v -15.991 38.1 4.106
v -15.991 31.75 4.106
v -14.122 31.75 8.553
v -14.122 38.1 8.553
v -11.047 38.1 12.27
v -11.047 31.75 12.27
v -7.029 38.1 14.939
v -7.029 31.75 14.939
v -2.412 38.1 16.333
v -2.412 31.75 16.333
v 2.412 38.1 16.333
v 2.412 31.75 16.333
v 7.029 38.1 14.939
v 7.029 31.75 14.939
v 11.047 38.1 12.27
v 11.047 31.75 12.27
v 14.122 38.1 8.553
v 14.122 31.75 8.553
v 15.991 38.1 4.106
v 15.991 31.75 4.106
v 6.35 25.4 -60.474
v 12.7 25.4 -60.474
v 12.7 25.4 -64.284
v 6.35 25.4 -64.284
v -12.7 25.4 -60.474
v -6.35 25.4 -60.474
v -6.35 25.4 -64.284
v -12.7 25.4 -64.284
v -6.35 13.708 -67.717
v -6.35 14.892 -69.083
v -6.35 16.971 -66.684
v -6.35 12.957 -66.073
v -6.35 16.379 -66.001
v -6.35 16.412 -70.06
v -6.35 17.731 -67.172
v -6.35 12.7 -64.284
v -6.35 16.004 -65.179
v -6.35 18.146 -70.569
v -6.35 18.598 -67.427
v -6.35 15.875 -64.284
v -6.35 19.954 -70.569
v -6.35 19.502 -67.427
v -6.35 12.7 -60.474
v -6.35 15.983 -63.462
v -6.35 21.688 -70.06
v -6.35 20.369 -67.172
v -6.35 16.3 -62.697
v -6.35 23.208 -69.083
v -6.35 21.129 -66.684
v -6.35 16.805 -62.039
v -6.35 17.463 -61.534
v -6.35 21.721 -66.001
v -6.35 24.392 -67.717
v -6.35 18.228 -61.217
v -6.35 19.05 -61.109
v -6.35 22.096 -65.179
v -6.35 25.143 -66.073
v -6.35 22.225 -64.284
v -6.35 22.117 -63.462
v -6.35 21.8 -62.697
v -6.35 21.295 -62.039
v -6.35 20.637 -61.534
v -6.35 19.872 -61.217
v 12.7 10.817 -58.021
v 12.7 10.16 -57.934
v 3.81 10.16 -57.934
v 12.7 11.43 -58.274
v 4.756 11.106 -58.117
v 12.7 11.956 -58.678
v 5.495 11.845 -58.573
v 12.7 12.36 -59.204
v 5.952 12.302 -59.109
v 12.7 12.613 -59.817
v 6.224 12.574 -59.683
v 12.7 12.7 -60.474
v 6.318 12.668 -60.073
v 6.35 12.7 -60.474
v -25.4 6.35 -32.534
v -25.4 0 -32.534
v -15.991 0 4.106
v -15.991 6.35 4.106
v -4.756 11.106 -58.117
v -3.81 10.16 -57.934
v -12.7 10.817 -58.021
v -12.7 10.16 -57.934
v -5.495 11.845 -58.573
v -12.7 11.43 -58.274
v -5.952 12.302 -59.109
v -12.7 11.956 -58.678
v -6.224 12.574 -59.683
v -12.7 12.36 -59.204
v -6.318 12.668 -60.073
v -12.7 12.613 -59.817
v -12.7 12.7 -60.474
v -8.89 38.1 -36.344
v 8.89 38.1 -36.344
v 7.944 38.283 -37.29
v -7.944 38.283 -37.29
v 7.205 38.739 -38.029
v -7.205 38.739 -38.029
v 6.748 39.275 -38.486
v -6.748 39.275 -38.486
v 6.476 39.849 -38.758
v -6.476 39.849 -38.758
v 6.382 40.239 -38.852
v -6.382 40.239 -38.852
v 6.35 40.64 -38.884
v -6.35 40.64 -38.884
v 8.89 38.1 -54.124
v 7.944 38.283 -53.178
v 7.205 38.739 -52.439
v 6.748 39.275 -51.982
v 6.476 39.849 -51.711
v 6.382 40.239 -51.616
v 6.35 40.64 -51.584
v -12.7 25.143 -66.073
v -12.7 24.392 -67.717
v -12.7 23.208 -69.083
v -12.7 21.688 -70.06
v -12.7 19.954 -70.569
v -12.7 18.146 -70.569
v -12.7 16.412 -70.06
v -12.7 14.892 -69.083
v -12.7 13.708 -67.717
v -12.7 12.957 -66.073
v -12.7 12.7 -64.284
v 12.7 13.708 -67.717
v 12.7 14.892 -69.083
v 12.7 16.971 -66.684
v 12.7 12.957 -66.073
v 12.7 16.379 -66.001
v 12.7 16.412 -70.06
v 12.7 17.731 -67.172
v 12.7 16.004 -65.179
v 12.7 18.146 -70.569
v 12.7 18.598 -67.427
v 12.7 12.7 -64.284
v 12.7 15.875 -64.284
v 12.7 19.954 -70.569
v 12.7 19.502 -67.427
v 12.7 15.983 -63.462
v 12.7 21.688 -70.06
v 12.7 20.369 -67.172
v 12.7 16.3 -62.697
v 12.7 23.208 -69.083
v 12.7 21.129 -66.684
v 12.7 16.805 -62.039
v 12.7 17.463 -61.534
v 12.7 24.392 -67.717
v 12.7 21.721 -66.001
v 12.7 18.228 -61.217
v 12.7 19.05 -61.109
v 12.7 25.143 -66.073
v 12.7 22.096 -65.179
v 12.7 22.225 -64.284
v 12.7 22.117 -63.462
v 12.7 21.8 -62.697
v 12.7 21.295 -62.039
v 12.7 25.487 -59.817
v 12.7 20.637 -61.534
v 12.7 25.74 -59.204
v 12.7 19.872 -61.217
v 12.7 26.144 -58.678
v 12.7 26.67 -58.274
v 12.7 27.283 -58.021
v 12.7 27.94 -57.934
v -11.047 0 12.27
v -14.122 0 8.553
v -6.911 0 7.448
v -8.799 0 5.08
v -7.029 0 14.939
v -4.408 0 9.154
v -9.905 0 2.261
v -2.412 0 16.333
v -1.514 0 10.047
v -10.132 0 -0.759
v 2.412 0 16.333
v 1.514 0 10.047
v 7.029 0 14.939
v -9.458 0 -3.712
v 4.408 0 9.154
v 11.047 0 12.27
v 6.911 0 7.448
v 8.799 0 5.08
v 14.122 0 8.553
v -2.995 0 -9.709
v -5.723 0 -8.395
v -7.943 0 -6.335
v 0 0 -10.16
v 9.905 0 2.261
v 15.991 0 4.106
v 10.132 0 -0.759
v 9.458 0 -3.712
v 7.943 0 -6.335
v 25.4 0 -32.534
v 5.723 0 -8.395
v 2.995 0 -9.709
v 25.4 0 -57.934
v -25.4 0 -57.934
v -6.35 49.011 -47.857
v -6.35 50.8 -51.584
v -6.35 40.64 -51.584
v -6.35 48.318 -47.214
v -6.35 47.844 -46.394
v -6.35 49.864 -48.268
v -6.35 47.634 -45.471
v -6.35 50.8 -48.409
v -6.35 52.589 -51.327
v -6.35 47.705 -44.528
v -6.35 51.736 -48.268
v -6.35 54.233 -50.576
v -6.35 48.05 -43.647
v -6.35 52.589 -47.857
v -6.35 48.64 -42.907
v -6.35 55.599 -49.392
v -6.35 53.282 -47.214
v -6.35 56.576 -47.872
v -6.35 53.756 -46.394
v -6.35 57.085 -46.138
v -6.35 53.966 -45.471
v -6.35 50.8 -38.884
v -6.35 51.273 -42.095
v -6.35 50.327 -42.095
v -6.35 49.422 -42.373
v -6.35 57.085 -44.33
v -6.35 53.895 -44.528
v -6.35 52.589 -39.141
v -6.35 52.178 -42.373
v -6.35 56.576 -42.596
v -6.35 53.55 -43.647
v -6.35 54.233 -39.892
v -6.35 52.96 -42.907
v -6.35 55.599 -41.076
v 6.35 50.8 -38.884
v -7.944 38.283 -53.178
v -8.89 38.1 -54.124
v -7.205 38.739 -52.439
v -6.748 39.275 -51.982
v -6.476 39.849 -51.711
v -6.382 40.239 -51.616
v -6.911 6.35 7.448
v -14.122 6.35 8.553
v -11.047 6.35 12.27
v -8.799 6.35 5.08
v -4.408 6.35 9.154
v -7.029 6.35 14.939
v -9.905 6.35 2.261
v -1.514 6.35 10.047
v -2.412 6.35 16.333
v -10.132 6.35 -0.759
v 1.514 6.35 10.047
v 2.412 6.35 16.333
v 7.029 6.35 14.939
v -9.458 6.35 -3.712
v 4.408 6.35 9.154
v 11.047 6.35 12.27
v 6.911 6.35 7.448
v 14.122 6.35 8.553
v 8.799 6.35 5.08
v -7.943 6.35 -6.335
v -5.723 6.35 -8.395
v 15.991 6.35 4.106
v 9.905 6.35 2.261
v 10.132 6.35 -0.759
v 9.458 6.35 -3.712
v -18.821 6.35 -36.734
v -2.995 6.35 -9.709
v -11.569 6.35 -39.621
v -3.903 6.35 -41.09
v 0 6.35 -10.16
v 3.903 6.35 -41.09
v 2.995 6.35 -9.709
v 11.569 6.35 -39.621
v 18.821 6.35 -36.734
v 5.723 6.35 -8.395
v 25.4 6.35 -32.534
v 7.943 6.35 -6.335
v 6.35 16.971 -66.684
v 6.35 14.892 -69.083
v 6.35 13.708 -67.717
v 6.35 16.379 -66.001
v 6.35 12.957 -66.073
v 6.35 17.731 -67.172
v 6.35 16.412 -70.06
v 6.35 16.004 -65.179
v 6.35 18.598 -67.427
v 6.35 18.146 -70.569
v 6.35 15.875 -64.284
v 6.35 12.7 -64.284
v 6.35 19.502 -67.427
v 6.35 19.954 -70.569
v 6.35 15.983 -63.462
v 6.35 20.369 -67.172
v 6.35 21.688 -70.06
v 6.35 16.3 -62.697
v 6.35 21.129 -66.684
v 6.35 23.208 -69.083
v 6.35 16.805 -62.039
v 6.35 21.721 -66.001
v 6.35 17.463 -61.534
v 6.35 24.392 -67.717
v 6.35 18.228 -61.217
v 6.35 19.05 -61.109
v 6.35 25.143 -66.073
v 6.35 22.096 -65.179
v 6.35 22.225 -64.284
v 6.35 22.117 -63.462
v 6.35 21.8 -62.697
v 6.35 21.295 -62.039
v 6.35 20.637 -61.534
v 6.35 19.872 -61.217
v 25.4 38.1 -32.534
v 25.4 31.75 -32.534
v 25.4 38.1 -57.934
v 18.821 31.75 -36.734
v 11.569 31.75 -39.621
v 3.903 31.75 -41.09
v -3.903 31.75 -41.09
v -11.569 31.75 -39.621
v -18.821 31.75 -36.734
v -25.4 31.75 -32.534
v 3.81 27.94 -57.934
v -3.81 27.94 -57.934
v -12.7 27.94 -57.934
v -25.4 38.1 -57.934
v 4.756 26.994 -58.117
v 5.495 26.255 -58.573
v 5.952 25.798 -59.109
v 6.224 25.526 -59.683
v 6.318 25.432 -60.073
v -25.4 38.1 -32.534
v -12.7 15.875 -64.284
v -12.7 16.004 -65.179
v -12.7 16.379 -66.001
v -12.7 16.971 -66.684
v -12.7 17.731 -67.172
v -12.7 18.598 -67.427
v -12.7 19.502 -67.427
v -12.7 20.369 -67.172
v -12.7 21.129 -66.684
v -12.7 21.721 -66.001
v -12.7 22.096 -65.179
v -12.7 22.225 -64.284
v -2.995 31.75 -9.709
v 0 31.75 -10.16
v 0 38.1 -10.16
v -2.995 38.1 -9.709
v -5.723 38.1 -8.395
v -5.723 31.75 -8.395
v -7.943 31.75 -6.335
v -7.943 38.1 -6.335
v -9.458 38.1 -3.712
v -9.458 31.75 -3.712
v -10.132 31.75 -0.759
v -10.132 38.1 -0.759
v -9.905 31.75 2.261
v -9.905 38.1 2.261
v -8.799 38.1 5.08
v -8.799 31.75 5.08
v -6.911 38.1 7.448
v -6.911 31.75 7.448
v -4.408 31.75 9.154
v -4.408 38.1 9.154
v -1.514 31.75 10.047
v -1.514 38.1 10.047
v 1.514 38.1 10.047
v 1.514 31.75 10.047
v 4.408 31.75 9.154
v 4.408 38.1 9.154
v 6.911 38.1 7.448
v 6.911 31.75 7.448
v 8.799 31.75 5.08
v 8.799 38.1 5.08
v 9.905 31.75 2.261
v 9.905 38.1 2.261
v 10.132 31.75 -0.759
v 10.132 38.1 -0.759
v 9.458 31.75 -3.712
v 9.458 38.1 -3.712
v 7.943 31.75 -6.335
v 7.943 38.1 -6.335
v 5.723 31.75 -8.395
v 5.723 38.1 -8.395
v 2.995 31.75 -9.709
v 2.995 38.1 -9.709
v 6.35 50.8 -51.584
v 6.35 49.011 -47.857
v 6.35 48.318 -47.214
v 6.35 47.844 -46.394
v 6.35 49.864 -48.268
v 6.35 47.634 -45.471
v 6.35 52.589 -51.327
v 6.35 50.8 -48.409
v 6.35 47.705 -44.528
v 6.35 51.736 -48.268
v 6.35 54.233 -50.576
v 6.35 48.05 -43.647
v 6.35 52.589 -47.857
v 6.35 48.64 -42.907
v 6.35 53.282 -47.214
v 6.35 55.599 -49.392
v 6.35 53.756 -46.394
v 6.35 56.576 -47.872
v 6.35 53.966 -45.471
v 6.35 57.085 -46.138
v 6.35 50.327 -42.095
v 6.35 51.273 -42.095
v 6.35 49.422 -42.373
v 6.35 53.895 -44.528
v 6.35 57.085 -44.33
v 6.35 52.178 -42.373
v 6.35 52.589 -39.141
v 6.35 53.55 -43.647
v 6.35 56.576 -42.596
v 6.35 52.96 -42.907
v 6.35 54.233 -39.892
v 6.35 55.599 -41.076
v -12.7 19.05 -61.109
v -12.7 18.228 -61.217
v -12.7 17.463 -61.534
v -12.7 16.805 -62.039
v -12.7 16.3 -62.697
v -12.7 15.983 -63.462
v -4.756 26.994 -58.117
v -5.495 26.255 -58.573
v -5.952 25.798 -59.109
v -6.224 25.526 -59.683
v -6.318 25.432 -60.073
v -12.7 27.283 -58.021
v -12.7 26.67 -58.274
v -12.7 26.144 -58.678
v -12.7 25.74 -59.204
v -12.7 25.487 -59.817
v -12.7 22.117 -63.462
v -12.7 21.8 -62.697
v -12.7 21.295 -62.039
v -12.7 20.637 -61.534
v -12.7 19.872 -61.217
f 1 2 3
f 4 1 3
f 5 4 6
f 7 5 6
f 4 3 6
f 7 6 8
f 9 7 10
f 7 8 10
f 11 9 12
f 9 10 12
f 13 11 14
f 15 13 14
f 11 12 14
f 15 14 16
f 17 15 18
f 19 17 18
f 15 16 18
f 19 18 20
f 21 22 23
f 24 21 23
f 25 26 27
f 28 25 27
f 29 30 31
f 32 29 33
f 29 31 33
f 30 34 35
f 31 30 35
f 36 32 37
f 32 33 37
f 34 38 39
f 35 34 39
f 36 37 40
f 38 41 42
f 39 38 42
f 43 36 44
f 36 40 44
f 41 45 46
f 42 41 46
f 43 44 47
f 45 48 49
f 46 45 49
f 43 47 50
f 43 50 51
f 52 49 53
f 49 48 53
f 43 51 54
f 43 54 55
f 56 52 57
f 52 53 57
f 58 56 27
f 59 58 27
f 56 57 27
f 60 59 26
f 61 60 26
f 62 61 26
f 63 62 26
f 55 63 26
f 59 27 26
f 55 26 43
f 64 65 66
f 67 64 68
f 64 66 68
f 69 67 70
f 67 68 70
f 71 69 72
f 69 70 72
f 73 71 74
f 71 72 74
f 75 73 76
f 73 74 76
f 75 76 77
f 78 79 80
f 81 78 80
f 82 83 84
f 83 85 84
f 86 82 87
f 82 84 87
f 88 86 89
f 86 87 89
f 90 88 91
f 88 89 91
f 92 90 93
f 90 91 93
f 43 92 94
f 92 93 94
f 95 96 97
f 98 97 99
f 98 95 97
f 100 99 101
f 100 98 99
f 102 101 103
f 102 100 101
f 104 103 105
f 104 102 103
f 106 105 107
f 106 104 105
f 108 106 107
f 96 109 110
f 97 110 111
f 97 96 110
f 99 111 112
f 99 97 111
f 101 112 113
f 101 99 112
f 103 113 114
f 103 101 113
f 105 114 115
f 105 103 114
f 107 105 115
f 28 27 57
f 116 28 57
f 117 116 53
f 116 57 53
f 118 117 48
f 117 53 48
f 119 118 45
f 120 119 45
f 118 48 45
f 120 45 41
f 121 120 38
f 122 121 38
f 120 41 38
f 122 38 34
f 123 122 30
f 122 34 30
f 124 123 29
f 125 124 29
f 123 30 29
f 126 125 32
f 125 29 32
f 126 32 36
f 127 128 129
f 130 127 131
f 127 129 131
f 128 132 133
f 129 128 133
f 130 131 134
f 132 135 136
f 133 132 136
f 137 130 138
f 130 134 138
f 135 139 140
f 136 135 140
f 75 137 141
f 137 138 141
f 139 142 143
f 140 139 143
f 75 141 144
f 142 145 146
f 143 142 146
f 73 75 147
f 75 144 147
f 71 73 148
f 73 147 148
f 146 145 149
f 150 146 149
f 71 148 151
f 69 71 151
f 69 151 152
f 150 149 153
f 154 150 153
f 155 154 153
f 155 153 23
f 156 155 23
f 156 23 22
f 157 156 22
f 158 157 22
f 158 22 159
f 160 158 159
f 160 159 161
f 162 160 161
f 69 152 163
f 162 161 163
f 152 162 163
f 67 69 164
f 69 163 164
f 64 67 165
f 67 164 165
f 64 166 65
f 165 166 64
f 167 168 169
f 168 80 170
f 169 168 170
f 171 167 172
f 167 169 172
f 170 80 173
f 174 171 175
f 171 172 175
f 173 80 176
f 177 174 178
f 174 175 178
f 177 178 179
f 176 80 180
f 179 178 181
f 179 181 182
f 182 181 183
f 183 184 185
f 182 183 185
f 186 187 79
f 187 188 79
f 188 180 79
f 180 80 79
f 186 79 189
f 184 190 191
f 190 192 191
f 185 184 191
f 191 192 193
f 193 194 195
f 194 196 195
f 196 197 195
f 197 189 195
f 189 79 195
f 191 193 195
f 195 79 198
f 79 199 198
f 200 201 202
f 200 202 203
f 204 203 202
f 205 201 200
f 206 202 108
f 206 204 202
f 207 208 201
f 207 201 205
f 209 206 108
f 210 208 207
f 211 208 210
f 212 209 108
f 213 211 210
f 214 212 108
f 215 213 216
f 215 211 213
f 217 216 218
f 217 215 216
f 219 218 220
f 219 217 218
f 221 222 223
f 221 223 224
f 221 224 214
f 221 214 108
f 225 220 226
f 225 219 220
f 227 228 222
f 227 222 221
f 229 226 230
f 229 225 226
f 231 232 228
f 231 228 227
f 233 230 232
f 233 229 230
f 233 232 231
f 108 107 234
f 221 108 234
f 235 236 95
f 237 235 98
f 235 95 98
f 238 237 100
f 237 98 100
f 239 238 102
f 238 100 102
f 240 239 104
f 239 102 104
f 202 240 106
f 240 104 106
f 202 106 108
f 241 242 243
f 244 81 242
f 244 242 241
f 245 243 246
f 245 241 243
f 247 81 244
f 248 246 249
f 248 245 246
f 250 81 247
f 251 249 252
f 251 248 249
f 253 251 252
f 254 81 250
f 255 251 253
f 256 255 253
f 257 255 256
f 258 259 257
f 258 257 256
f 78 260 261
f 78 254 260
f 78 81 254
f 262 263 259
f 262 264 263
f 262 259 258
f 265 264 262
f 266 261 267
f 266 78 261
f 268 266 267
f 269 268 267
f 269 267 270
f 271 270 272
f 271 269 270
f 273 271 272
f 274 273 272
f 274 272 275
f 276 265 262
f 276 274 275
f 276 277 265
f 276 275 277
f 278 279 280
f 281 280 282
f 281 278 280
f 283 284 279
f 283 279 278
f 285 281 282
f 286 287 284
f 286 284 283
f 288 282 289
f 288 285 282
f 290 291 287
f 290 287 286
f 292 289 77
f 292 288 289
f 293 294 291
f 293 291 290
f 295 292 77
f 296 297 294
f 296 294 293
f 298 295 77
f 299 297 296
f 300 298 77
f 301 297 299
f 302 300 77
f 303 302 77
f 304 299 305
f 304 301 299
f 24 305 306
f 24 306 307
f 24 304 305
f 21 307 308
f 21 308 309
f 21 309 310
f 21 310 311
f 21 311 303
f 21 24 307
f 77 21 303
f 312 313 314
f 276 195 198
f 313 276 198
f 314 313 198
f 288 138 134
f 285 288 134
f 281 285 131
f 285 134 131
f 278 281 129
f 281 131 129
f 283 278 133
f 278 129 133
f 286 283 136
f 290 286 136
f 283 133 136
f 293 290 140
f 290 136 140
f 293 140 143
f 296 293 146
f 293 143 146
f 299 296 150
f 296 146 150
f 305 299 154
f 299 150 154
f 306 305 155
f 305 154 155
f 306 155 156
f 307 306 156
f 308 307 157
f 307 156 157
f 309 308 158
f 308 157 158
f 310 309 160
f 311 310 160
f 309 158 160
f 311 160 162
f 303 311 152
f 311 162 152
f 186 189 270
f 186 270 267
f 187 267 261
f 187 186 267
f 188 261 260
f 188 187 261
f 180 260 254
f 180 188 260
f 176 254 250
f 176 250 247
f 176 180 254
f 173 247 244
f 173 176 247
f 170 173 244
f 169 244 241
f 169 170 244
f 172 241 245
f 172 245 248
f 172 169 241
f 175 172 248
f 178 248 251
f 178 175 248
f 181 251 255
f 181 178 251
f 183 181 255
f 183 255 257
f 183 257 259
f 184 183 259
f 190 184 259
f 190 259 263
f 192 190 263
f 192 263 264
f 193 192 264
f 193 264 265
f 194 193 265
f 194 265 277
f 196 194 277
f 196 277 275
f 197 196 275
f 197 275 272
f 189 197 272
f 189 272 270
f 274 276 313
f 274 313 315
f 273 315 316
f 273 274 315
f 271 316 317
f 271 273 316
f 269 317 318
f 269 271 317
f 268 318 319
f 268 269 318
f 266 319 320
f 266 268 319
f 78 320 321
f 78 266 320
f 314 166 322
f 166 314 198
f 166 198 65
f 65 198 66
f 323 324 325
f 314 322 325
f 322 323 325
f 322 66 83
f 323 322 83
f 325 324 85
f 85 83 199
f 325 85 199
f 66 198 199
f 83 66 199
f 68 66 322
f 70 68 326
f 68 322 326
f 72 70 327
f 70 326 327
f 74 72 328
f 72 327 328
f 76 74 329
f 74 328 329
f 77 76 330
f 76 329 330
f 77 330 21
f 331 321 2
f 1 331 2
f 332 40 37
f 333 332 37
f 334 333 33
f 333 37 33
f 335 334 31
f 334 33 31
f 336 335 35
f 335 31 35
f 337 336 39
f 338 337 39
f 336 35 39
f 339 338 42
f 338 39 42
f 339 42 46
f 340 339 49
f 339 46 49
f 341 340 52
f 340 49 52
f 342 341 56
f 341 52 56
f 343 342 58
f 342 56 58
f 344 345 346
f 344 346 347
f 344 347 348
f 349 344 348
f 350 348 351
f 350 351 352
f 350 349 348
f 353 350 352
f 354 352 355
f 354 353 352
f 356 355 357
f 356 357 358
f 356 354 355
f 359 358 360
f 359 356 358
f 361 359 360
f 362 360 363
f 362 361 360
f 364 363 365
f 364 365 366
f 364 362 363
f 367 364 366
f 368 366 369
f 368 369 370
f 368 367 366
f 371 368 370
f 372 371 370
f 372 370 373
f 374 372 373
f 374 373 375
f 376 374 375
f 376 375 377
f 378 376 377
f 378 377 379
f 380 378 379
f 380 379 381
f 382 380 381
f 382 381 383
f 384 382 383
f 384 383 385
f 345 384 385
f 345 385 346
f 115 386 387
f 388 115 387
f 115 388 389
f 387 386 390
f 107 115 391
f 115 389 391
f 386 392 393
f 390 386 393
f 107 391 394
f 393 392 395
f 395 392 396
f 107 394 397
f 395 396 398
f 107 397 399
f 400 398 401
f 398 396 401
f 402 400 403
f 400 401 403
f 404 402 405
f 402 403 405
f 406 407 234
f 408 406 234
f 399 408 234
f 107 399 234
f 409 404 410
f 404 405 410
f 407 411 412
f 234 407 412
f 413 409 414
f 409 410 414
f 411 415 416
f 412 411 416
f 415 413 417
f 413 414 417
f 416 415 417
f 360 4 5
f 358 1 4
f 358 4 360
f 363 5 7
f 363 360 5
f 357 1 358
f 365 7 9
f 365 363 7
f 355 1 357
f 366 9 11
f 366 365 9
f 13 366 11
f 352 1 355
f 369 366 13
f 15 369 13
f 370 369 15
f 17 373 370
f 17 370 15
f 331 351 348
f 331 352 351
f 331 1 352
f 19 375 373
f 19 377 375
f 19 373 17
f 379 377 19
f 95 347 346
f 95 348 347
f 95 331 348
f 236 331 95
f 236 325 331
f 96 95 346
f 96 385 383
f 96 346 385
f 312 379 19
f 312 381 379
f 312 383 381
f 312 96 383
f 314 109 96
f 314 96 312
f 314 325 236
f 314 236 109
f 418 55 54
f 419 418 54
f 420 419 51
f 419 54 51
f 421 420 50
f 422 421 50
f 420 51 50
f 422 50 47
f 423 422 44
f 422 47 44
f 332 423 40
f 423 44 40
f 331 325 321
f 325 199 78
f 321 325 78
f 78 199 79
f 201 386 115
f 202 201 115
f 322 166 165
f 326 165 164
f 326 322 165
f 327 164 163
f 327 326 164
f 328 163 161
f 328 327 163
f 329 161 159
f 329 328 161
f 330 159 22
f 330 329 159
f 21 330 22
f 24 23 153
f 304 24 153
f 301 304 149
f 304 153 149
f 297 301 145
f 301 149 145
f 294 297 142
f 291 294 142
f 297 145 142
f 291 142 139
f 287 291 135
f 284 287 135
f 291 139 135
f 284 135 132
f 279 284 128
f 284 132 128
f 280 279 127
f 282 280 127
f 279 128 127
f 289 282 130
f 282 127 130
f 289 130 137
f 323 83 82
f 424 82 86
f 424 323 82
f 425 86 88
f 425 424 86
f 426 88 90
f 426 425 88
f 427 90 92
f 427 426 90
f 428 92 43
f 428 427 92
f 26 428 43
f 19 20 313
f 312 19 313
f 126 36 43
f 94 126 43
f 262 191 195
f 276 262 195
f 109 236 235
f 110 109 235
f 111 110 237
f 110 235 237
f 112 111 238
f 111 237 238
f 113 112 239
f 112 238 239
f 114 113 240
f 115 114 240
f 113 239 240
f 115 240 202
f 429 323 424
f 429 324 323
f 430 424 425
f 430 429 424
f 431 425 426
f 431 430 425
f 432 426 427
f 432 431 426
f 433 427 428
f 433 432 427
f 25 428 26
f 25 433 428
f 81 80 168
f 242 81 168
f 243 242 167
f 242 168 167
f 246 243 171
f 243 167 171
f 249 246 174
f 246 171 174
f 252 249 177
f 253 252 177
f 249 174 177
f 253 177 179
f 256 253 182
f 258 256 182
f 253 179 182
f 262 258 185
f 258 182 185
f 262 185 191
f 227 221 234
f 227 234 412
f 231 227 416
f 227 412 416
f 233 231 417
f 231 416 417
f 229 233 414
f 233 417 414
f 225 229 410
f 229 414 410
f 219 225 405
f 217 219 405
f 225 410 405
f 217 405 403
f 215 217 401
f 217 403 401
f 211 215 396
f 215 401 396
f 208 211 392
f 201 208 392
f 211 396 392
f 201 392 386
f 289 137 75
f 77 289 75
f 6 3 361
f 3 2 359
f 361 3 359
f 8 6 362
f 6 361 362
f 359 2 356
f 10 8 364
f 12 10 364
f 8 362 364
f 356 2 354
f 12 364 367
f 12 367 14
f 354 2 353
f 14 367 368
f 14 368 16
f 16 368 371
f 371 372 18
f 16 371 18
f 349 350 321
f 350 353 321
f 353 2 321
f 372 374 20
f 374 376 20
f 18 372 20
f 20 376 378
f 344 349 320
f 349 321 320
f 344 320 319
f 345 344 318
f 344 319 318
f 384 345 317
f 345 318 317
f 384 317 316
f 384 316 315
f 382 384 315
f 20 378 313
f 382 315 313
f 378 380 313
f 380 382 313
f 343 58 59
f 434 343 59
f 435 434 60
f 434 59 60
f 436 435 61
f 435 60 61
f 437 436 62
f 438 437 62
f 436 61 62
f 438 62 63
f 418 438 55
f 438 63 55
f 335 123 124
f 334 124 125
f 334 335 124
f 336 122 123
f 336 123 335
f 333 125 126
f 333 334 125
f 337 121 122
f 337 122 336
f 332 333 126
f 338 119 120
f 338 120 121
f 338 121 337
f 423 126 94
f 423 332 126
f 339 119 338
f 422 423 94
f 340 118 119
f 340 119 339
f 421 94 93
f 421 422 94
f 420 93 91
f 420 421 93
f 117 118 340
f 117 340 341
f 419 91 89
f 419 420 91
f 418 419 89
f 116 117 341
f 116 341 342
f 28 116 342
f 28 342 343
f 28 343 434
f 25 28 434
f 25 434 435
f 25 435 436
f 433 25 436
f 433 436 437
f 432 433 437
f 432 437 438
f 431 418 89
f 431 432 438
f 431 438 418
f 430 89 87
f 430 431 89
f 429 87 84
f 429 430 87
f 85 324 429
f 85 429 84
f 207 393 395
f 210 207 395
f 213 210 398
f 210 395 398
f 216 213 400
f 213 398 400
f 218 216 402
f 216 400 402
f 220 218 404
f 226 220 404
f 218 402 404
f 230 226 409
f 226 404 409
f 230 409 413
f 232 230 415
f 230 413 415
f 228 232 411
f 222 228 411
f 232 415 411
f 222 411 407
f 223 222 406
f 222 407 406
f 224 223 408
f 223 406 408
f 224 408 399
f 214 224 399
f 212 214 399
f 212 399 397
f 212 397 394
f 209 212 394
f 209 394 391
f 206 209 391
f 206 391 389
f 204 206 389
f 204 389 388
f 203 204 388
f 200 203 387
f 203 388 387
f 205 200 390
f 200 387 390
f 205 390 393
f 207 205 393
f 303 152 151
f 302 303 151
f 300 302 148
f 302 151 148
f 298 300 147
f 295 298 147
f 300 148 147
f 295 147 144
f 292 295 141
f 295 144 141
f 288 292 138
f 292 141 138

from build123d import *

# Parameters (mm, degrees)
SKETCH1_R                = 10.16
BOSS_EXTRUDE1_DEPTH      = 38.1
CUT_EXTRUDE1_START       = 6.35
SKETCH1_3_R              = 10.16
CUT_EXTRUDE1_DEPTH       = 25.4
BOSS_EXTRUDE2_DEPTH      = 6.35
BOSS_EXTRUDE2_DEPTH_BACK = 6.35
SKETCH3_R                = 3.175
BOSS_EXTRUDE3_START      = 6.35
SKETCH4_R                = 3.175
BOSS_EXTRUDE3_DEPTH      = 6.35
BOSS_EXTRUDE4_START      = -12.7
SKETCH4_3_R              = 3.175
BOSS_EXTRUDE4_DEPTH      = 6.35
FILLET1_R                = 2.54


with BuildPart() as part:
    # Sketch1 → Boss-Extrude1 (new body)
    with BuildSketch(Plane(origin=(0, 0, 0), x_dir=(1, 0, 0), z_dir=(0, 1, 0))):
        with BuildLine():
            Line((15.991186592, -4.106342823), (25.4, 32.534068682))
            Line((25.4, 32.534068682), (25.4, 57.934068682))
            Line((25.4, 57.934068682), (-25.4, 57.934068682))
            Line((-25.4, 57.934068682), (-25.4, 32.534068682))
            Line((-25.4, 32.534068682), (-15.991186592, -4.106342823))
            ThreePointArc((-15.991186592, -4.106342823), (0, -16.51), (15.991186592, -4.106342823))
        make_face()
        Circle(SKETCH1_R, mode=Mode.SUBTRACT)
    extrude(amount=BOSS_EXTRUDE1_DEPTH)

    # Sketch1<3> → Cut-Extrude1 (cut)
    with BuildSketch(Plane(origin=(0, 0, 0), x_dir=(1, 0, 0), z_dir=(0, 1, 0)).offset(CUT_EXTRUDE1_START)):
        with BuildLine():
            Line((15.991186592, -4.106342823), (25.4, 32.534068682))
            ThreePointArc((25.4, 32.534068682), (0, 41.275), (-25.4, 32.534068682))
            Line((-25.4, 32.534068682), (-15.991186592, -4.106342823))
            ThreePointArc((-15.991186592, -4.106342823), (0, -16.51), (15.991186592, -4.106342823))
        make_face()
        Circle(SKETCH1_3_R, mode=Mode.SUBTRACT)
    extrude(amount=CUT_EXTRUDE1_DEPTH, mode=Mode.SUBTRACT)

    # Sketch3 → Boss-Extrude2 (add, two sides: drawn at the far end of the back side and taken through both)
    with BuildSketch(Plane.ZY.offset(-BOSS_EXTRUDE2_DEPTH_BACK)):
        with BuildLine():
            Line((-51.584068682, 38.1), (-38.884068682, 38.1))
            Line((-38.884068682, 38.1), (-38.884068682, 50.8))
            ThreePointArc((-38.884068682, 50.8), (-45.234068682, 57.15), (-51.584068682, 50.8))
            Line((-51.584068682, 50.8), (-51.584068682, 38.1))
        make_face()
        with Locations((-45.234068682, 50.8)):
            Circle(SKETCH3_R, mode=Mode.SUBTRACT)
    extrude(amount=BOSS_EXTRUDE2_DEPTH + BOSS_EXTRUDE2_DEPTH_BACK)

    # Sketch4 → Boss-Extrude3 (add)
    with BuildSketch(Plane.ZY.offset(BOSS_EXTRUDE3_START)):
        with BuildLine():
            Line((-57.934068682, 12.7), (-57.934068682, 25.4))
            Line((-57.934068682, 25.4), (-64.284068682, 25.4))
            ThreePointArc((-64.284068682, 25.4), (-70.634068682, 19.05), (-64.284068682, 12.7))
            Line((-64.284068682, 12.7), (-57.934068682, 12.7))
        make_face()
        with Locations((-64.284068682, 19.05)):
            Circle(SKETCH4_R, mode=Mode.SUBTRACT)
    extrude(amount=BOSS_EXTRUDE3_DEPTH)

    # Sketch4<3> → Boss-Extrude4 (add)
    with BuildSketch(Plane.ZY.offset(BOSS_EXTRUDE4_START)):
        with BuildLine():
            Line((-57.934068682, 12.7), (-57.934068682, 25.4))
            Line((-57.934068682, 25.4), (-64.284068682, 25.4))
            ThreePointArc((-64.284068682, 25.4), (-70.634068682, 19.05), (-64.284068682, 12.7))
            Line((-64.284068682, 12.7), (-57.934068682, 12.7))
        make_face()
        with Locations((-64.284068682, 19.05)):
            Circle(SKETCH4_3_R, mode=Mode.SUBTRACT)
    extrude(amount=BOSS_EXTRUDE4_DEPTH)

    # Fillet1
    fillet1_edges = [part.edges().sort_by_distance(p)[0] for p in [
        (9.525, 12.7, -57.934068682),
        (9.525, 25.4, -57.934068682),
        (-9.525, 12.7, -57.934068682),
        (-9.525, 25.4, -57.934068682),
        (6.35, 38.1, -45.234068682),
        (-6.35, 38.1, -45.234068682),
        (0, 38.1, -38.884068682),
        (0, 38.1, -51.584068682),
        (-6.35, 19.05, -57.934068682),
        (6.35, 19.05, -57.934068682),
    ]]
    fillet(fillet1_edges, radius=FILLET1_R)


solid = part.part
